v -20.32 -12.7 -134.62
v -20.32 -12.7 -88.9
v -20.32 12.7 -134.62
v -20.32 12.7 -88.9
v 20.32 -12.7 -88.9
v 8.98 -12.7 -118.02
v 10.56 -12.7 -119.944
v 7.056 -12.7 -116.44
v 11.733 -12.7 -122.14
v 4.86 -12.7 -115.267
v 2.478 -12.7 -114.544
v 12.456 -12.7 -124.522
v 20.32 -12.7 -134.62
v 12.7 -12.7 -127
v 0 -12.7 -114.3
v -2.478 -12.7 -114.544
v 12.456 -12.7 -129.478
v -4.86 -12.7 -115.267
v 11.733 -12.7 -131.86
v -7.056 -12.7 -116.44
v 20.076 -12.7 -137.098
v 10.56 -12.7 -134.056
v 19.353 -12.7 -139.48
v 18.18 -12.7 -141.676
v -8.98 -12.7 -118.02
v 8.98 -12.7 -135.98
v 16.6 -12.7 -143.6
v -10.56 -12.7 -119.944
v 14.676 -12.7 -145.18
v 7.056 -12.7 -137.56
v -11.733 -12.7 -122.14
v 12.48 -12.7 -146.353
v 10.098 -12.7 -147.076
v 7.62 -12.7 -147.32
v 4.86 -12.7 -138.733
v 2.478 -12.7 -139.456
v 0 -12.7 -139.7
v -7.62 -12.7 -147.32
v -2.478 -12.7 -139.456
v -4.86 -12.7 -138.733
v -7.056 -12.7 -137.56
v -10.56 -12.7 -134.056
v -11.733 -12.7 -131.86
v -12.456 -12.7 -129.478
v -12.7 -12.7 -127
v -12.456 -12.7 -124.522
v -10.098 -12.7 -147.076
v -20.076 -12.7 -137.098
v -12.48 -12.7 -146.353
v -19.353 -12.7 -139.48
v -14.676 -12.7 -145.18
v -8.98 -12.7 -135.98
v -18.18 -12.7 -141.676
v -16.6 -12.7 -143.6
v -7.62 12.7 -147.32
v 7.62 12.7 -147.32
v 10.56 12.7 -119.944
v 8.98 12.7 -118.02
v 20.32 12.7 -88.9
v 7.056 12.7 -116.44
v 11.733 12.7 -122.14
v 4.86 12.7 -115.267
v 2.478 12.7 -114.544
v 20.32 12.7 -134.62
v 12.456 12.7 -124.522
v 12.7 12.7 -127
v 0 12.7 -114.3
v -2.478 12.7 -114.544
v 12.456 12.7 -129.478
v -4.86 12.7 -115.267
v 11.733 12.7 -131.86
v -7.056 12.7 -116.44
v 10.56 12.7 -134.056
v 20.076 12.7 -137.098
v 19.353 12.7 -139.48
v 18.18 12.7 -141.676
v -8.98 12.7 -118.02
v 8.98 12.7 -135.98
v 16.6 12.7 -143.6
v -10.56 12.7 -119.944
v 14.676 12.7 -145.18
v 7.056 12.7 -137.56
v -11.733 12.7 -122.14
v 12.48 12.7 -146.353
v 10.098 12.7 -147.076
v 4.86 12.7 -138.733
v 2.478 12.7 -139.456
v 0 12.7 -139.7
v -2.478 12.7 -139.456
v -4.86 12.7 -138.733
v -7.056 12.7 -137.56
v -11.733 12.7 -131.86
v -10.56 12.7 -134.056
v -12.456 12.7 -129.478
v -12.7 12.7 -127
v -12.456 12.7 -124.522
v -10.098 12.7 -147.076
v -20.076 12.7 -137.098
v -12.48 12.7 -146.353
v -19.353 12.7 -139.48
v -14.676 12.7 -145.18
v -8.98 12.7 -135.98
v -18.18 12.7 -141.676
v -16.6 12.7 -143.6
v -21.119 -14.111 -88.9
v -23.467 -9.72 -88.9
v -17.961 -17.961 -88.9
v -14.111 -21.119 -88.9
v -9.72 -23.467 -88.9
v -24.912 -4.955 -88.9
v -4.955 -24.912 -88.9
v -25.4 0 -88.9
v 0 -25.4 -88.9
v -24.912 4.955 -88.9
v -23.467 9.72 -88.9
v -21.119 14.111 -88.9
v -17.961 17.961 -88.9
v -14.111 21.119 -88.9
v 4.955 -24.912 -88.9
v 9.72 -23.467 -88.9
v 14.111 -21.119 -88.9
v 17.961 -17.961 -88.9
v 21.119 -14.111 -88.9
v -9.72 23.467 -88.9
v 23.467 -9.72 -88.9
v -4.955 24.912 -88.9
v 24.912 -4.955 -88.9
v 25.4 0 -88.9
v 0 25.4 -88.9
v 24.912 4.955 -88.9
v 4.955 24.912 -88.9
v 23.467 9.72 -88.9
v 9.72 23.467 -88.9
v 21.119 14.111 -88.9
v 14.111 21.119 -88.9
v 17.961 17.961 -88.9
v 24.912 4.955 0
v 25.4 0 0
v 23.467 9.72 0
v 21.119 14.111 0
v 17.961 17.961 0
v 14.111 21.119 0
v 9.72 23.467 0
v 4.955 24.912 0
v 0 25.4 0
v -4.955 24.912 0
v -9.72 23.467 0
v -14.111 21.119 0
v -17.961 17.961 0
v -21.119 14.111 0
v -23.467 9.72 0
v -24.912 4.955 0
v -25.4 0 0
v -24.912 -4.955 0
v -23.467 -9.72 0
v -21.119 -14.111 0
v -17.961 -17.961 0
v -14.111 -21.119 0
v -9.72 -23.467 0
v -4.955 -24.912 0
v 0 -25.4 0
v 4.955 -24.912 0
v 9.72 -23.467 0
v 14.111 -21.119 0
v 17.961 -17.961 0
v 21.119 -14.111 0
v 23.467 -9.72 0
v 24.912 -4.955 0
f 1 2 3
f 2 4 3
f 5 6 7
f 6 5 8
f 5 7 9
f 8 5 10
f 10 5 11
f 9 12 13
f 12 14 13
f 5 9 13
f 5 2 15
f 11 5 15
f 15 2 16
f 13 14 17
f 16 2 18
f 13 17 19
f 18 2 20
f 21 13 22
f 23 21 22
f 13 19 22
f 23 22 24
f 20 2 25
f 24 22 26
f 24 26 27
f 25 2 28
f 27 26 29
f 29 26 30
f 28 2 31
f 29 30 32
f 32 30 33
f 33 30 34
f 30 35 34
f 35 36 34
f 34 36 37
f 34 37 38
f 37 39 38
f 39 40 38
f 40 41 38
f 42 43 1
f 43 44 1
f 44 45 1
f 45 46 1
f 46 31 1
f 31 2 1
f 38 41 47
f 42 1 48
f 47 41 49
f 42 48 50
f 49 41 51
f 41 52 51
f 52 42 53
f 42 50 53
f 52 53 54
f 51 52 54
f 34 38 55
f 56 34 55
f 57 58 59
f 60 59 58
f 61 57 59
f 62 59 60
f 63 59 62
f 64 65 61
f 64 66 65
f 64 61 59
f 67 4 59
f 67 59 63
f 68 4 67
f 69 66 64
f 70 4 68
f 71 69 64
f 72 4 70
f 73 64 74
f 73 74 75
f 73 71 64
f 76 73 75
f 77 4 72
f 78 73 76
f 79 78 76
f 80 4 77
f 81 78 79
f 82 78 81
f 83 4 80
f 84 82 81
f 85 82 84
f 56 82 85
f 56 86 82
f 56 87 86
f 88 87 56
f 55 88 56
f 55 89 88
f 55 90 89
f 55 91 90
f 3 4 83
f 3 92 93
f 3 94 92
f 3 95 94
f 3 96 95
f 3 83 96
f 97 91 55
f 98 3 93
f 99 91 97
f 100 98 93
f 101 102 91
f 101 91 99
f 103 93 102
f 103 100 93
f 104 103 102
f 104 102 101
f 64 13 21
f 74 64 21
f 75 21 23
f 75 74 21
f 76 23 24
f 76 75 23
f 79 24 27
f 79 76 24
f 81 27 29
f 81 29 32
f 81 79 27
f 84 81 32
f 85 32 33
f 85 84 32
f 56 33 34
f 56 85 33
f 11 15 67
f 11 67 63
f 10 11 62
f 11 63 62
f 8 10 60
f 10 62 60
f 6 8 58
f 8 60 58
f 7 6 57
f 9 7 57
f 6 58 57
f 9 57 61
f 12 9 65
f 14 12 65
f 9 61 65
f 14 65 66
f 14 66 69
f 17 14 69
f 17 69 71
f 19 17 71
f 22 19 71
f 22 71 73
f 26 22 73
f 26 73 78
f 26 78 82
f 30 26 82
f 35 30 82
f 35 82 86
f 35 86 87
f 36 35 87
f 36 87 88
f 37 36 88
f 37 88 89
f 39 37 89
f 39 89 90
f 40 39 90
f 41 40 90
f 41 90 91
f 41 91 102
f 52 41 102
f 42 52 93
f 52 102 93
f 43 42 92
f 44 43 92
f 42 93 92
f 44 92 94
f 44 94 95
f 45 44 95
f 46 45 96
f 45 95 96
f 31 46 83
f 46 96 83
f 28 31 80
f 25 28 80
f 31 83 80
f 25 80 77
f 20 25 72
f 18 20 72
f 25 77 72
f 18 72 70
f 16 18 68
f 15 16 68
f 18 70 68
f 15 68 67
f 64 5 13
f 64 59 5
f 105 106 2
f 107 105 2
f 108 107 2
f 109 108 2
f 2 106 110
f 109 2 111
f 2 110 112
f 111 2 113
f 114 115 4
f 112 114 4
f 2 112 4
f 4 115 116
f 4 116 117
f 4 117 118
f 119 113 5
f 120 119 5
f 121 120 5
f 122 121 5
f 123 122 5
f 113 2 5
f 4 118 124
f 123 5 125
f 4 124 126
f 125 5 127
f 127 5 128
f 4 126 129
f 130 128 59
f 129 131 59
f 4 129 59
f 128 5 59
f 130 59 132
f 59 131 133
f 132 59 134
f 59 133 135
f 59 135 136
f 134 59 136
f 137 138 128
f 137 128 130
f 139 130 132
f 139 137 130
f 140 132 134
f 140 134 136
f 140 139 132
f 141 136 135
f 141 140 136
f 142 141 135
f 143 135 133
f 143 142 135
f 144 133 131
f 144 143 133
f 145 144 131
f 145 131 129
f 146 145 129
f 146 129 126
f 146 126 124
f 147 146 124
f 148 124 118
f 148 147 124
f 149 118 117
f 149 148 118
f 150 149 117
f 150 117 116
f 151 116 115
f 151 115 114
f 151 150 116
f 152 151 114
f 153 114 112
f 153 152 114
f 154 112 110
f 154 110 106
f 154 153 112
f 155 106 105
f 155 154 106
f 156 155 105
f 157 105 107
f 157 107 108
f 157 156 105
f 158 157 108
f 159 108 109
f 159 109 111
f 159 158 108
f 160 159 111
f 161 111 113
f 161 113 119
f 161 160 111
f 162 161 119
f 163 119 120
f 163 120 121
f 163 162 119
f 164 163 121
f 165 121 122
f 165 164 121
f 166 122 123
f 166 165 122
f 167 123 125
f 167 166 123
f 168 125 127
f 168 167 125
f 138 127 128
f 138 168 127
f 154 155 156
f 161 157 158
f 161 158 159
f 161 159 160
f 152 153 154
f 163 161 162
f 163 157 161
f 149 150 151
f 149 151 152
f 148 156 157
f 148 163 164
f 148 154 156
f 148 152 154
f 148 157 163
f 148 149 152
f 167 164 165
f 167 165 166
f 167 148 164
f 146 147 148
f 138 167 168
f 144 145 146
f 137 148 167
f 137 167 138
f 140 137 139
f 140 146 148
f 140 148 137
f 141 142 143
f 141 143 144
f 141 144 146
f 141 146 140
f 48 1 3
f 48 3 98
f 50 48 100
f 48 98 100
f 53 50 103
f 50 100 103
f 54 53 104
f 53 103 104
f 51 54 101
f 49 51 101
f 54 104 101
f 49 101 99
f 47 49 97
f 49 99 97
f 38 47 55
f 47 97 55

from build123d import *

# Parameters (mm, degrees)
SKETCH1_R                = 25.4
BOSS_EXTRUDE1_DEPTH      = 88.9
BOSS_EXTRUDE2_DEPTH      = 20.32
BOSS_EXTRUDE2_DEPTH_BACK = 20.32
SKETCH2_W                = 58.42
SKETCH2_H                = 25.4
FILLET1_R                = 12.7
SKETCH3_R                = 12.7
CUT_EXTRUDE3_DEPTH       = 155.272331933


with BuildPart() as part:
    # Sketch1 → Boss-Extrude1 (new body)
    with BuildSketch(Plane.XY):
        Circle(SKETCH1_R)
    extrude(amount=-BOSS_EXTRUDE1_DEPTH)

    # Sketch2 → Boss-Extrude2 (add, two sides: drawn at the far end of the back side and taken through both)
    with BuildSketch(Plane(origin=(0, 0, 0), x_dir=(0, 0, -1), z_dir=(1, 0, 0)).offset(-BOSS_EXTRUDE2_DEPTH_BACK)):
        with Locations((118.11, 0)):
            Rectangle(SKETCH2_W, SKETCH2_H)
    extrude(amount=BOSS_EXTRUDE2_DEPTH + BOSS_EXTRUDE2_DEPTH_BACK)

    # Fillet1
    fillet1_edges = [part.edges().sort_by_distance(p)[0] for p in [
        (20.32, 0, -147.32),
        (-20.32, 0, -147.32),
    ]]
    fillet(fillet1_edges, radius=FILLET1_R)

    # Sketch3 → Cut-Extrude3 (cut, through all)
    with BuildSketch(Plane(origin=(0, 12.7, 0), x_dir=(1, 0, 0), z_dir=(0, 1, 0))):
        with Locations((0, 127)):
            Circle(SKETCH3_R)
    extrude(amount=-CUT_EXTRUDE3_DEPTH, mode=Mode.SUBTRACT)


solid = part.part
